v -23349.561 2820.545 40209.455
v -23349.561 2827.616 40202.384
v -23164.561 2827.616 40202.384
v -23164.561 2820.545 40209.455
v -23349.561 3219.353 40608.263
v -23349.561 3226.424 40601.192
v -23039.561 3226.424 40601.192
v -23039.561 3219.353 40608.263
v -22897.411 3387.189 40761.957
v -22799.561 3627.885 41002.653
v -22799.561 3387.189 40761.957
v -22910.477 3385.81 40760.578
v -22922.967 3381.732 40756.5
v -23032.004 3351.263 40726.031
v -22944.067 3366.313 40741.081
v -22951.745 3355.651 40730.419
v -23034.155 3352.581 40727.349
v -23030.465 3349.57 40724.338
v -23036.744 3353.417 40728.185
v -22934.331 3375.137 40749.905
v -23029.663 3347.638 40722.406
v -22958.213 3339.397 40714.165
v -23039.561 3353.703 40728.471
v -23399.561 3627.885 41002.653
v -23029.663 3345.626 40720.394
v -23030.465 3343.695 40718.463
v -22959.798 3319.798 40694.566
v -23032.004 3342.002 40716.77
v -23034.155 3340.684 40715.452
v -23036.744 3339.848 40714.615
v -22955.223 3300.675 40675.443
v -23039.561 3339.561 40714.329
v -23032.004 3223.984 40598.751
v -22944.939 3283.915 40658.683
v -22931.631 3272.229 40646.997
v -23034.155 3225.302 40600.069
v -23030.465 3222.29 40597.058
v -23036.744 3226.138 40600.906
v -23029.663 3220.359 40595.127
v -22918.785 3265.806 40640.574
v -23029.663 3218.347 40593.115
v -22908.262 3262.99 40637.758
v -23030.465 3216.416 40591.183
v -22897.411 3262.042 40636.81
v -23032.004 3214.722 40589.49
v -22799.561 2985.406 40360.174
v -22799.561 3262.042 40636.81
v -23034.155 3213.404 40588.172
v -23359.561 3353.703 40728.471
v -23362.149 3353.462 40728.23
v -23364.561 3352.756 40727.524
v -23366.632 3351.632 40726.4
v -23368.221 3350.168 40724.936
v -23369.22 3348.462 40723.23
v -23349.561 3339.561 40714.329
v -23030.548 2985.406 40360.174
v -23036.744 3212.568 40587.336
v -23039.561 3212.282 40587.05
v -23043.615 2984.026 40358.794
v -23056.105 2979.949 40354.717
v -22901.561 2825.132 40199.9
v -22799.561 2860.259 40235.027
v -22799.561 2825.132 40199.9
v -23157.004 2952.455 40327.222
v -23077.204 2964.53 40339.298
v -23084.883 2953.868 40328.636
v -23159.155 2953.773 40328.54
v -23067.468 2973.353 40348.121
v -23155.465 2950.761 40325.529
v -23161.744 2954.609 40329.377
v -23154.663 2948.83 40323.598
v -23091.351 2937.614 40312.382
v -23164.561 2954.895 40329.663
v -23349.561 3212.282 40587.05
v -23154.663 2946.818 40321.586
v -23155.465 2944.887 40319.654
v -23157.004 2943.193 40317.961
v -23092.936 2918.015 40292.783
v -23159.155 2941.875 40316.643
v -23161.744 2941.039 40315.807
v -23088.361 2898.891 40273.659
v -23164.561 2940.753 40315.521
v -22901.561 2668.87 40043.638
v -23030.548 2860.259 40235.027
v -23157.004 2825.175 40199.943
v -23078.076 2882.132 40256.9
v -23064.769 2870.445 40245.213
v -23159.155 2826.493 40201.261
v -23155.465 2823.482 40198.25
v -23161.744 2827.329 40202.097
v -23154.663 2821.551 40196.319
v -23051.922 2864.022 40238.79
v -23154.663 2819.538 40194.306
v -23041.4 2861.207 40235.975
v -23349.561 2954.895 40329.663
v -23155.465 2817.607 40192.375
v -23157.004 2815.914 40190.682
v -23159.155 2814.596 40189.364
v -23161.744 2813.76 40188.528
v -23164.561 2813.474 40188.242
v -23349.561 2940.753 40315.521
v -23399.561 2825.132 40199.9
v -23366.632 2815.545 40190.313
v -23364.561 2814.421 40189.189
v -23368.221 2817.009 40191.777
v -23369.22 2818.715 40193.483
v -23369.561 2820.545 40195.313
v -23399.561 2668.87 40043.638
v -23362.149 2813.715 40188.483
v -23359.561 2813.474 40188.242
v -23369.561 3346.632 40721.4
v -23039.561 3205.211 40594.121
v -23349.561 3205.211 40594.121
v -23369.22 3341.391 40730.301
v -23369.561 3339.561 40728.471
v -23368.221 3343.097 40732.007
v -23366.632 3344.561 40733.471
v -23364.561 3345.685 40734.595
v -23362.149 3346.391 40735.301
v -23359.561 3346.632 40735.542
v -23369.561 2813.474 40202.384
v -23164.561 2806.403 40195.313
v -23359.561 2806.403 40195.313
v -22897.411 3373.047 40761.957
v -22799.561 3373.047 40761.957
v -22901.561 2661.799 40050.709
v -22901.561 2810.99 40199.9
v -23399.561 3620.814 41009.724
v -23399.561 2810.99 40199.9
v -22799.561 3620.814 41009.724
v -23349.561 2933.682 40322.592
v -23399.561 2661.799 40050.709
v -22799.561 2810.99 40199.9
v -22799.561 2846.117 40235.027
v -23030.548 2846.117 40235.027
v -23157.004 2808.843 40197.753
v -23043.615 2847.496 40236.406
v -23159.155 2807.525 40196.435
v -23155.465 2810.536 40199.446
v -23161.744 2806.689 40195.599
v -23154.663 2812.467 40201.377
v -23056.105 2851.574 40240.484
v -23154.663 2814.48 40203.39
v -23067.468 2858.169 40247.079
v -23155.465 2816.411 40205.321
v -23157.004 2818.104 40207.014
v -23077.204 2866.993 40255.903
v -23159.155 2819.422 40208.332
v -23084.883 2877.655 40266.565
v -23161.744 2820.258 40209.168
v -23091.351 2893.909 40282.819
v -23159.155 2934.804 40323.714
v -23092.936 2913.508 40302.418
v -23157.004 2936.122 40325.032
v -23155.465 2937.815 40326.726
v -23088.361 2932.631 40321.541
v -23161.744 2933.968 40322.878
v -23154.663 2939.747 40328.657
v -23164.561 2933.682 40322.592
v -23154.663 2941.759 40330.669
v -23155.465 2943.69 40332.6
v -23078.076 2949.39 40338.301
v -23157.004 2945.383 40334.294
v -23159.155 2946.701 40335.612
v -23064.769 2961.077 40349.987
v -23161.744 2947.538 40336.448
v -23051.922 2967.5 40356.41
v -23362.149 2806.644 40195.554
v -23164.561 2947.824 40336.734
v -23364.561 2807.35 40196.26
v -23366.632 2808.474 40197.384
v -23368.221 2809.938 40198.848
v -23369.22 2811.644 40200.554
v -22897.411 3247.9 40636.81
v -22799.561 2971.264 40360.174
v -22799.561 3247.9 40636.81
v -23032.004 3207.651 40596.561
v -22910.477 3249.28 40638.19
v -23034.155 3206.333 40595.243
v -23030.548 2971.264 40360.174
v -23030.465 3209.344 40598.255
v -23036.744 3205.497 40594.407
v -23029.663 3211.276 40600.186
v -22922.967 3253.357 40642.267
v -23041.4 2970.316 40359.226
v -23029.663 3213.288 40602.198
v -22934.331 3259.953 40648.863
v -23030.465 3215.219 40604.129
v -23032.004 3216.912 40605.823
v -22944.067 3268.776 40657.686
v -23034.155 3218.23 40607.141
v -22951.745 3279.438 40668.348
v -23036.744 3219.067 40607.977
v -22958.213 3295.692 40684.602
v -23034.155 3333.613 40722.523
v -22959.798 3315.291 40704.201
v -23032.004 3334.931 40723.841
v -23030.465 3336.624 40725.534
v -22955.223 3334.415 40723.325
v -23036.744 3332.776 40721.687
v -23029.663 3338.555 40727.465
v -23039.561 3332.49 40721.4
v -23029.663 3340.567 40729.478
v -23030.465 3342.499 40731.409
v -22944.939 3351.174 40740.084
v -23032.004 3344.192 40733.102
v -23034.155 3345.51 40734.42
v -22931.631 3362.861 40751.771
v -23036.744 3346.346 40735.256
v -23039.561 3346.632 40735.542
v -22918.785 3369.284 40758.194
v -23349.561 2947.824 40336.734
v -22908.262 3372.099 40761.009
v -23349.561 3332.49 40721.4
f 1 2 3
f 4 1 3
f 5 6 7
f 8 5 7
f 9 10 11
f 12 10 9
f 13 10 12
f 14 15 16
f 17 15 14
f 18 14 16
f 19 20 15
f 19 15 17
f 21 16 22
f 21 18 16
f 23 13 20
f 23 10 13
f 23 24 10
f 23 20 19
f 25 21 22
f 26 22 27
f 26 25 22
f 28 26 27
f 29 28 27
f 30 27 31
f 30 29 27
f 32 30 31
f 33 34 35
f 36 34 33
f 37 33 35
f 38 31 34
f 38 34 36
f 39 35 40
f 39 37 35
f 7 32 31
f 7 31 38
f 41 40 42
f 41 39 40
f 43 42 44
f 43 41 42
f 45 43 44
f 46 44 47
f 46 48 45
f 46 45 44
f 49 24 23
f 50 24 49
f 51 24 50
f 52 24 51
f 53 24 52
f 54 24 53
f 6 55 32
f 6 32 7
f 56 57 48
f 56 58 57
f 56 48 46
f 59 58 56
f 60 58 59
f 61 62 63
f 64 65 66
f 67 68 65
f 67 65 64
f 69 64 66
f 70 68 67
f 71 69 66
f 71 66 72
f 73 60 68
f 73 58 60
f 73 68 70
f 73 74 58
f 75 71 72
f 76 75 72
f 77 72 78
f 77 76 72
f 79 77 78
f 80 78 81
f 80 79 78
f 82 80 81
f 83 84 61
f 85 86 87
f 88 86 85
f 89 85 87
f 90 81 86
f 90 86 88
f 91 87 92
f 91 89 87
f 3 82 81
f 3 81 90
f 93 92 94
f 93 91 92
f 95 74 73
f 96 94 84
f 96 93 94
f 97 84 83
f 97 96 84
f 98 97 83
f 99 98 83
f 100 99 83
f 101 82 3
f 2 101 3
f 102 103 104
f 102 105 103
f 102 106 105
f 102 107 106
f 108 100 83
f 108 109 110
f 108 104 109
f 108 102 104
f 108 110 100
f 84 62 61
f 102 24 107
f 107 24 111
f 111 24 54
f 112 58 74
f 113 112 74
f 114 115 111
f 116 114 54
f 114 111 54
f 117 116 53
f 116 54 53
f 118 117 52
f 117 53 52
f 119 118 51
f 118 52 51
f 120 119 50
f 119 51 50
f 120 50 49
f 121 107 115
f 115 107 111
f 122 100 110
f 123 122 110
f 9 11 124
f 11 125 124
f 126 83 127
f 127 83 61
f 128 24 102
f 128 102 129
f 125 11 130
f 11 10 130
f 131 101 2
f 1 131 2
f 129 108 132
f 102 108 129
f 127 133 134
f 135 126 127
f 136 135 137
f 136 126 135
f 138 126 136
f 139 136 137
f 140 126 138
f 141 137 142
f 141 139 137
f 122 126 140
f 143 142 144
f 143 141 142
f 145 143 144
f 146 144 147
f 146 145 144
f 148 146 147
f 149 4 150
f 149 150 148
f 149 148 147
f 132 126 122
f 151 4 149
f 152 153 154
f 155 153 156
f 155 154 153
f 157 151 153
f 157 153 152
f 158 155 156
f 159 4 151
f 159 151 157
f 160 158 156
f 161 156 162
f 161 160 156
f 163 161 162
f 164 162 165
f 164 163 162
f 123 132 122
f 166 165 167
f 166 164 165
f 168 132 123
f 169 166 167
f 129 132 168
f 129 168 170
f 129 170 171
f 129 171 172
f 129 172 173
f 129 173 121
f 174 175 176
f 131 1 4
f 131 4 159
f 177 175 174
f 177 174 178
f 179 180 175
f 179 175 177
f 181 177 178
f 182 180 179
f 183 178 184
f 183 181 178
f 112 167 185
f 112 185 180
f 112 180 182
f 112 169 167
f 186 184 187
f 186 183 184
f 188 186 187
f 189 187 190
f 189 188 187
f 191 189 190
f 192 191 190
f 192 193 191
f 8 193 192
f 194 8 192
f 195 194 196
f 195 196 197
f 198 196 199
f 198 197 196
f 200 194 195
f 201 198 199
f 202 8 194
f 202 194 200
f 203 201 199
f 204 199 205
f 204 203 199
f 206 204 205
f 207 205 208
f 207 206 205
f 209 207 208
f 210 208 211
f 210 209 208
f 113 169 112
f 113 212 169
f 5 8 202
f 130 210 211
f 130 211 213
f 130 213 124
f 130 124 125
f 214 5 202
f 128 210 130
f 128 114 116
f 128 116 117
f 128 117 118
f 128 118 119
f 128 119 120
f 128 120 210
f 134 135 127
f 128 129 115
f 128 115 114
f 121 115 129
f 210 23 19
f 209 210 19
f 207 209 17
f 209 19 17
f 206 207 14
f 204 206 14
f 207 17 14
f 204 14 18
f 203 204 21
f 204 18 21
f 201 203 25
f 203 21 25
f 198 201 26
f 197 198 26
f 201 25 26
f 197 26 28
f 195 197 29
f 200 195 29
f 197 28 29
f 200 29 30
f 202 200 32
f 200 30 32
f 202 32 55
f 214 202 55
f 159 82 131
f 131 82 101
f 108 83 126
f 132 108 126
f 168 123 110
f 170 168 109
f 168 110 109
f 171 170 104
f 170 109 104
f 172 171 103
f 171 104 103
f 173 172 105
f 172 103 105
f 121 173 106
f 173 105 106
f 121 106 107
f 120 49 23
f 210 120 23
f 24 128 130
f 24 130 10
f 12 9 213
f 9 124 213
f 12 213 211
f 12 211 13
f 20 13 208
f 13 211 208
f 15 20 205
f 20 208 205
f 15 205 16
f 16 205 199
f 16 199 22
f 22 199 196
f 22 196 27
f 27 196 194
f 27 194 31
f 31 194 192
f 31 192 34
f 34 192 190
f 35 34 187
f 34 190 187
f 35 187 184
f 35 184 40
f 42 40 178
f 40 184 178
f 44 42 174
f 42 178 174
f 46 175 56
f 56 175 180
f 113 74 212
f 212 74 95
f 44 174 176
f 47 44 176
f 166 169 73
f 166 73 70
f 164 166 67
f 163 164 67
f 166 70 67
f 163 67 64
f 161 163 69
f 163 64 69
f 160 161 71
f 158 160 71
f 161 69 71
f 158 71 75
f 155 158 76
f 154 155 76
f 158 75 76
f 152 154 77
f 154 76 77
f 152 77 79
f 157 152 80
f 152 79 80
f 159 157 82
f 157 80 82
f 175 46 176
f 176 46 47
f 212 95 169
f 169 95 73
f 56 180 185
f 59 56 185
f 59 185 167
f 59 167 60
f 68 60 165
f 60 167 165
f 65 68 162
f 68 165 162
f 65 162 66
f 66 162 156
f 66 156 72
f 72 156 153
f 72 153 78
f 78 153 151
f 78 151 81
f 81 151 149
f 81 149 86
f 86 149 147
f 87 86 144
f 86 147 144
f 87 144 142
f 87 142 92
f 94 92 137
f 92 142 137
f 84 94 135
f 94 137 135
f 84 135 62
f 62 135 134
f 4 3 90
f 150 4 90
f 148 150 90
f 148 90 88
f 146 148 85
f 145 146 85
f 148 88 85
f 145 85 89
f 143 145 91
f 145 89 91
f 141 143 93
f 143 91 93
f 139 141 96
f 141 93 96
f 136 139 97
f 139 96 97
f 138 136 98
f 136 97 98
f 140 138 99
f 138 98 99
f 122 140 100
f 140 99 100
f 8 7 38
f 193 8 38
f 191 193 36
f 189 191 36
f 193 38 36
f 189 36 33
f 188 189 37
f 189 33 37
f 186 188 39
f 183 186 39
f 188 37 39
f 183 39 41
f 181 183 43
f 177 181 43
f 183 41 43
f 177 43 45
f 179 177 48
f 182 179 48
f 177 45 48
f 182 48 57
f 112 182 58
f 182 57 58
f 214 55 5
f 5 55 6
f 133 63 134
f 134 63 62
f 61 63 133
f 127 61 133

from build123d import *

# Parameters (mm, degrees)
BOSS_EXTRUDE1_START = -22799.561142
BOSS_EXTRUDE1_DEPTH = 600
CUT_EXTRUDE1_START  = 2846.116519
CUT_EXTRUDE1_DEPTH  = 541.072944
BOSS_EXTRUDE2_DEPTH = 498
CUT_EXTRUDE2_DEPTH  = 689.125788175


with BuildPart() as part:
    # Sketch3 → Boss-Extrude1 (new body)
    with BuildSketch(Plane(origin=(0, 0, 0), x_dir=(0, 0, -1), z_dir=(1, 0, 0)).offset(BOSS_EXTRUDE1_START)):
        Polygon((-40199.900195068, 2810.990103756), (-41009.724035702, 3620.813944389), (-41002.65296789, 3627.885012201), (-40199.900195068, 2825.132239379), align=None)
    extrude(amount=-BOSS_EXTRUDE1_DEPTH)

    # Sketch4 → Cut-Extrude1 (cut)
    with BuildSketch(Plane(origin=(0, 0, 0), x_dir=(1, 0, 0), z_dir=(0, 1, 0)).offset(CUT_EXTRUDE1_START)):
        with BuildLine():
            Line((-22799.561141737, -40360.17380628), (-23030.548097876, -40360.17380628))
            ThreePointArc((-23030.548097876, -40360.17380628), (-23093.121695819, -40297.600208337), (-23030.548097876, -40235.026610394))
            Line((-23030.548097876, -40235.026610394), (-22799.561141737, -40235.026610394))
            Line((-22799.561141737, -40235.026610394), (-22799.561141737, -40360.17380628))
        make_face()
        with BuildLine():
            Line((-22799.561141728, -40761.957418224), (-22897.41060103, -40761.957418224))
            ThreePointArc((-22897.41060103, -40761.957418224), (-22959.984198973, -40699.383820281), (-22897.41060103, -40636.810222338))
            Line((-22897.41060103, -40636.810222338), (-22799.561141728, -40636.810222338))
            Line((-22799.561141728, -40636.810222338), (-22799.561141728, -40761.957418224))
        make_face()
    extrude(amount=CUT_EXTRUDE1_DEPTH, mode=Mode.SUBTRACT)

    # Sketch5 → Boss-Extrude2 (add)
    with BuildSketch(Plane.ZY.offset(23399.561141728)):
        Polygon((40050.70934907, 2661.799257758), (40199.900195068, 2810.990103756), (40199.900195068, 2825.132239379), (40043.638281258, 2668.870325569), align=None)
    extrude(amount=-BOSS_EXTRUDE2_DEPTH)

    # Sketch6 → Cut-Extrude2 (cut, through all)
    with BuildSketch(Plane(origin=(0, -18687.383977844, 18687.383977844), x_dir=(1, 0, 0), z_dir=(0, 0.707106781, -0.707106781))):
        with BuildLine():
            Line((-23349.561141728, -30426.804477376), (-23164.561141728, -30426.804477376))
            ThreePointArc((-23164.561141728, -30426.804477376), (-23154.561141728, -30416.804477376), (-23164.561141728, -30406.804477376))
            Line((-23164.561141728, -30406.804477376), (-23359.561141728, -30406.804477376))
            ThreePointArc((-23359.561141728, -30406.804477376), (-23366.63220954, -30409.733409565), (-23369.561141728, -30416.804477376))
            Line((-23369.561141728, -30416.804477376), (-23369.561141728, -31160.804477376))
            ThreePointArc((-23369.561141728, -31160.804477376), (-23366.63220954, -31167.875545188), (-23359.561141728, -31170.804477376))
            Line((-23359.561141728, -31170.804477376), (-23039.561141728, -31170.804477376))
            ThreePointArc((-23039.561141728, -31170.804477376), (-23029.561141728, -31160.804477376), (-23039.561141728, -31150.804477376))
            Line((-23039.561141728, -31150.804477376), (-23349.561141728, -31150.804477376))
            Line((-23349.561141728, -31150.804477376), (-23349.561141728, -30990.804477376))
            Line((-23349.561141728, -30990.804477376), (-23039.561141728, -30990.804477376))
            ThreePointArc((-23039.561141728, -30990.804477376), (-23029.561141728, -30980.804477376), (-23039.561141728, -30970.804477376))
            Line((-23039.561141728, -30970.804477376), (-23349.561141728, -30970.804477376))
            Line((-23349.561141728, -30970.804477376), (-23349.561141728, -30606.804477376))
            Line((-23349.561141728, -30606.804477376), (-23164.561141728, -30606.804477376))
            ThreePointArc((-23164.561141728, -30606.804477376), (-23154.561141728, -30596.804477376), (-23164.561141728, -30586.804477376))
            Line((-23164.561141728, -30586.804477376), (-23349.561141728, -30586.804477376))
            Line((-23349.561141728, -30586.804477376), (-23349.561141728, -30426.804477376))
        make_face()
    extrude(amount=-CUT_EXTRUDE2_DEPTH, mode=Mode.SUBTRACT)


solid = part.part
